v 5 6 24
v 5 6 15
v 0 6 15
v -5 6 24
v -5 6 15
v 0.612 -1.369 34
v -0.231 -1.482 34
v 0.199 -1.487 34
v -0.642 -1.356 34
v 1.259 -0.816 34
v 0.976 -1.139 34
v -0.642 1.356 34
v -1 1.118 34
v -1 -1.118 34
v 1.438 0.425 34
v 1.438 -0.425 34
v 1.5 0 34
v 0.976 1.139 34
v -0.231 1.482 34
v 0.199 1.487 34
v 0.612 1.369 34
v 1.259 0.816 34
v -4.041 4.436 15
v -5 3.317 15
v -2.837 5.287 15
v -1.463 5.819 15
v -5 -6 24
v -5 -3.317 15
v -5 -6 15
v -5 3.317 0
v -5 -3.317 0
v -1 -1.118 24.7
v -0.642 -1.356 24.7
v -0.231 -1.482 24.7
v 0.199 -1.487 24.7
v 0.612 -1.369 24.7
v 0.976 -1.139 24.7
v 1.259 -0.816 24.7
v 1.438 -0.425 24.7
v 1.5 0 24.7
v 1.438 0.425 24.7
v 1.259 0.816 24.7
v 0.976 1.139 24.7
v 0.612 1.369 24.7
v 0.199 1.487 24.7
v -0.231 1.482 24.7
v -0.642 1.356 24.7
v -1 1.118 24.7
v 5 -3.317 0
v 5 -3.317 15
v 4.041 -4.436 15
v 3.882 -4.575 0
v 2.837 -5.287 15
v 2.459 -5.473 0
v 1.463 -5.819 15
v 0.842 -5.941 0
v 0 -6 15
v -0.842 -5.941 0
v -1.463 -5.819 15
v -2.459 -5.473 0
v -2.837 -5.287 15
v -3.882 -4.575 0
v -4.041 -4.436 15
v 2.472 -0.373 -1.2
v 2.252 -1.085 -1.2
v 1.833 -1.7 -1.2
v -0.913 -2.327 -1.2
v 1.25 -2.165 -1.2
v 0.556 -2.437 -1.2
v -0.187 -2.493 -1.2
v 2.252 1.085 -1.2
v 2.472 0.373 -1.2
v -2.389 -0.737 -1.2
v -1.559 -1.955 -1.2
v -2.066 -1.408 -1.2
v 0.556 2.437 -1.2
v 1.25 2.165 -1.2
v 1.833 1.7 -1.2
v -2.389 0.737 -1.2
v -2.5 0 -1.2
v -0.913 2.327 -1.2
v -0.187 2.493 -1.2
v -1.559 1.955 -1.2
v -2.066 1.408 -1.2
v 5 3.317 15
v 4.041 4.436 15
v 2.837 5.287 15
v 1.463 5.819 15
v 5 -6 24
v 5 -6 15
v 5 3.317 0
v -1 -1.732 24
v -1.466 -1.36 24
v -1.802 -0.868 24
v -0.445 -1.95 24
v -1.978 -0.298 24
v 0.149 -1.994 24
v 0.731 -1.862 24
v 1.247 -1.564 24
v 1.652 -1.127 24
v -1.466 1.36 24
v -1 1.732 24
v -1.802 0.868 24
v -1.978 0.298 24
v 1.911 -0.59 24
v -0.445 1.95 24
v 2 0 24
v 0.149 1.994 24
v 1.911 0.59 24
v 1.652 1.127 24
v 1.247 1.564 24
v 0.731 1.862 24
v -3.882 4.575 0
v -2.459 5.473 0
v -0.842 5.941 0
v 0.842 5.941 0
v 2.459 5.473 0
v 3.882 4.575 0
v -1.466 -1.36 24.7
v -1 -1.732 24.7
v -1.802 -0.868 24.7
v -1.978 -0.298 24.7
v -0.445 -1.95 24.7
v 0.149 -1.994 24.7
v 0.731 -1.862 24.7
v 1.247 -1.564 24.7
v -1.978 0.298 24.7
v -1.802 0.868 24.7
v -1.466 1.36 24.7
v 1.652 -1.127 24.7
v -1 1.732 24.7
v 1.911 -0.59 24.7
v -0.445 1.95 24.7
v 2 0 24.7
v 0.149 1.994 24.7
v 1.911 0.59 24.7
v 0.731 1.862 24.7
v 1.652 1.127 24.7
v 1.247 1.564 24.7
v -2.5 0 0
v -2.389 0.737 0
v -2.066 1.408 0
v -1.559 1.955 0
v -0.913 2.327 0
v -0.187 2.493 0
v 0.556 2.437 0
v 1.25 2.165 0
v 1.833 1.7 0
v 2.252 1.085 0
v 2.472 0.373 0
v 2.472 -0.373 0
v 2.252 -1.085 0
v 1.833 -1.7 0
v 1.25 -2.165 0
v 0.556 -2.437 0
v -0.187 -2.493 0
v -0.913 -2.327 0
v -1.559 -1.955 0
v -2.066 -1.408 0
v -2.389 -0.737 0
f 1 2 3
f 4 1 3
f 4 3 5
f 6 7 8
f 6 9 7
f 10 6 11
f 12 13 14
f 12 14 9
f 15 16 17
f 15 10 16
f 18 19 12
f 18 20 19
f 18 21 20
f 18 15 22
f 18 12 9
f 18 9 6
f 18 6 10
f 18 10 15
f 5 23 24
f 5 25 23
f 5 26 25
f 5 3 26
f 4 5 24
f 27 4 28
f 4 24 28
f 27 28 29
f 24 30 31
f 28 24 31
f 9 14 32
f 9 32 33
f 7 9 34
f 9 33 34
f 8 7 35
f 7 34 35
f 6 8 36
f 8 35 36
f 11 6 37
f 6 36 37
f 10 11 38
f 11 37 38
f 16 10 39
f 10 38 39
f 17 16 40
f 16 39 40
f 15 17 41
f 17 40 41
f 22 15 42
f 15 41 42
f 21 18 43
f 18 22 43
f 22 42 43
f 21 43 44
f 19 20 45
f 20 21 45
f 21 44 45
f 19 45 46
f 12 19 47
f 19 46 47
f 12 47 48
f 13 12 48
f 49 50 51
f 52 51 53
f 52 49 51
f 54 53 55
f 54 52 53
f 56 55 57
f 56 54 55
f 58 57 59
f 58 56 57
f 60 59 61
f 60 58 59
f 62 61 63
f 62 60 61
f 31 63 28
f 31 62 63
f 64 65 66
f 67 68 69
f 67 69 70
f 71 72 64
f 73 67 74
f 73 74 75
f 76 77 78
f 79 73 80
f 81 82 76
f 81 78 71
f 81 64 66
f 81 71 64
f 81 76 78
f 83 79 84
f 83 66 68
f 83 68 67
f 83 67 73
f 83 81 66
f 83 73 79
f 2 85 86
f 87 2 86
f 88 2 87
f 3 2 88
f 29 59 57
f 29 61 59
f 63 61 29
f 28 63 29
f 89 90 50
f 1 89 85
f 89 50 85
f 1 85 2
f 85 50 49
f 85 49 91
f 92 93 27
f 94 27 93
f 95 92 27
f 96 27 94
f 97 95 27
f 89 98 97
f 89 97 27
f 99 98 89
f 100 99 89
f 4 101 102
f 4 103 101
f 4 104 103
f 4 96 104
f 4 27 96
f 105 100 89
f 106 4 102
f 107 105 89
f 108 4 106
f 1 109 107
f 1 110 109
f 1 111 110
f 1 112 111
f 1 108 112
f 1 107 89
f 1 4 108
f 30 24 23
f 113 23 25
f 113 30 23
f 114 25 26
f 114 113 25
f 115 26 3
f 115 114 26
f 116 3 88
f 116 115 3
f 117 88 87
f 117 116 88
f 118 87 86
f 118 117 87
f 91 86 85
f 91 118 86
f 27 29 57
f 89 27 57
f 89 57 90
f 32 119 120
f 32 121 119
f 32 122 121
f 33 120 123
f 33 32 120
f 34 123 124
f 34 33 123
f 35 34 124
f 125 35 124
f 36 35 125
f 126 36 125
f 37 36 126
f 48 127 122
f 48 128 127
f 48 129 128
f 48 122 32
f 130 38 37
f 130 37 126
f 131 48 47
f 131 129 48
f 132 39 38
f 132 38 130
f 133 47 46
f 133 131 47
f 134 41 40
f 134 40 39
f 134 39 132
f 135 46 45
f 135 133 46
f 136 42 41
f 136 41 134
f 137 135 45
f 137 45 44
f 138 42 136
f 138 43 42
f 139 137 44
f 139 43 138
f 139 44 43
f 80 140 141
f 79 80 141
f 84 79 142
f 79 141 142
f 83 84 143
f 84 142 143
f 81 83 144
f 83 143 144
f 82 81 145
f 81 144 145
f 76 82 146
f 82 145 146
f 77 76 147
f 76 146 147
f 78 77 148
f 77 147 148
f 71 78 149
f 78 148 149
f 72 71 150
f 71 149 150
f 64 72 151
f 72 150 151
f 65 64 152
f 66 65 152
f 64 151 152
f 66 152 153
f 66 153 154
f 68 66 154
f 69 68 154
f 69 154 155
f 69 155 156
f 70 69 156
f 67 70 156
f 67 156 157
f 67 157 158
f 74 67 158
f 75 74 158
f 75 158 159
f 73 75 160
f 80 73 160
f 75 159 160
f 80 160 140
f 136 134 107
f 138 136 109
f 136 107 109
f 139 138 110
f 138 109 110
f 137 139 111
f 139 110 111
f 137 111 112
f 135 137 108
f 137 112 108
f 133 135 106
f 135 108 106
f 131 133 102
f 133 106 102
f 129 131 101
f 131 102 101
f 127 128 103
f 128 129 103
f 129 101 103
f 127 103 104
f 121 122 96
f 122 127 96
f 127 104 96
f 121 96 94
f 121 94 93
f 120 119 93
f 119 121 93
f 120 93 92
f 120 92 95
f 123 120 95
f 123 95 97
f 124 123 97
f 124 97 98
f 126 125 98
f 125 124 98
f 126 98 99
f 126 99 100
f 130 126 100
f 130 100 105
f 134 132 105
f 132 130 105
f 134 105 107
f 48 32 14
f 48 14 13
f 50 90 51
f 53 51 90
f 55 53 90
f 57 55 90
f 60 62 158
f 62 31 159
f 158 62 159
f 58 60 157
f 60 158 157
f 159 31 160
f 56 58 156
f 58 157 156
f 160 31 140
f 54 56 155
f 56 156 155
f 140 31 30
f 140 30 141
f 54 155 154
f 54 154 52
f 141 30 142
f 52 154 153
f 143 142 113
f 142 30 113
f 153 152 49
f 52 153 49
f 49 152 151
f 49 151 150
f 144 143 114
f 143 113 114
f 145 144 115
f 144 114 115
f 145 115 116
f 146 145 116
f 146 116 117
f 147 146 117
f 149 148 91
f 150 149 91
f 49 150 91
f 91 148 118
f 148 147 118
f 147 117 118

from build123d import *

# Parameters (mm, degrees)
EXTRUDE_1_DEPTH     = 24
SKETCH_2_R          = 2.5
EXTRUDE_2_DEPTH     = 1.2
SKETCH_3_R          = 2
EXTRUDE_3_DEPTH     = 0.7
SKETCH_5_R          = 1.5
EXTRUDE_5_DEPTH     = 9.3
SKETCH_6_R          = 8.807991622
SKETCH_6_R_2        = 6
CUT_EXTRUDE_1_DEPTH = 15
CUT_EXTRUDE_2_DEPTH = 9.3


with BuildPart() as part:
    # 草图1 → 凸台-拉伸1 (new body)
    with BuildSketch(Plane.XY):
        Polygon((5, 0), (5, 6), (-5, 6), (-5, -6), (5, -6), align=None)
    extrude(amount=EXTRUDE_1_DEPTH)

    # 草图2 → 凸台-拉伸2 (add)
    with BuildSketch(Plane(origin=(0, 0, 0), x_dir=(-1, 0, 0), z_dir=(0, 0, -1))):
        Circle(SKETCH_2_R)
    extrude(amount=EXTRUDE_2_DEPTH)

    # 草图3 → 凸台-拉伸3 (add)
    with BuildSketch(Plane.XY.offset(24)):
        Circle(SKETCH_3_R)
    extrude(amount=EXTRUDE_3_DEPTH)

    # 草图5 → 凸台-拉伸5 (add)
    with BuildSketch(Plane.XY.offset(24.7)):
        Circle(SKETCH_5_R)
    extrude(amount=EXTRUDE_5_DEPTH)

    # 草图6 → 切除-拉伸1 (cut)
    with BuildSketch(Plane(origin=(0, 0, 0), x_dir=(-1, 0, 0), z_dir=(0, 0, -1))):
        Circle(SKETCH_6_R)
        Circle(SKETCH_6_R_2, mode=Mode.SUBTRACT)
    extrude(amount=-CUT_EXTRUDE_1_DEPTH, mode=Mode.SUBTRACT)

    # 草图7 → 切除-拉伸2 (cut)
    with BuildSketch(Plane.XY.offset(34)):
        Polygon((-1, 0), (-1, 3.342262846), (-2.573415309, 3.342262846), (-2.573415309, -2.211230932), (-1, -2.211230932), align=None)
    extrude(amount=-CUT_EXTRUDE_2_DEPTH, mode=Mode.SUBTRACT)


solid = part.part
